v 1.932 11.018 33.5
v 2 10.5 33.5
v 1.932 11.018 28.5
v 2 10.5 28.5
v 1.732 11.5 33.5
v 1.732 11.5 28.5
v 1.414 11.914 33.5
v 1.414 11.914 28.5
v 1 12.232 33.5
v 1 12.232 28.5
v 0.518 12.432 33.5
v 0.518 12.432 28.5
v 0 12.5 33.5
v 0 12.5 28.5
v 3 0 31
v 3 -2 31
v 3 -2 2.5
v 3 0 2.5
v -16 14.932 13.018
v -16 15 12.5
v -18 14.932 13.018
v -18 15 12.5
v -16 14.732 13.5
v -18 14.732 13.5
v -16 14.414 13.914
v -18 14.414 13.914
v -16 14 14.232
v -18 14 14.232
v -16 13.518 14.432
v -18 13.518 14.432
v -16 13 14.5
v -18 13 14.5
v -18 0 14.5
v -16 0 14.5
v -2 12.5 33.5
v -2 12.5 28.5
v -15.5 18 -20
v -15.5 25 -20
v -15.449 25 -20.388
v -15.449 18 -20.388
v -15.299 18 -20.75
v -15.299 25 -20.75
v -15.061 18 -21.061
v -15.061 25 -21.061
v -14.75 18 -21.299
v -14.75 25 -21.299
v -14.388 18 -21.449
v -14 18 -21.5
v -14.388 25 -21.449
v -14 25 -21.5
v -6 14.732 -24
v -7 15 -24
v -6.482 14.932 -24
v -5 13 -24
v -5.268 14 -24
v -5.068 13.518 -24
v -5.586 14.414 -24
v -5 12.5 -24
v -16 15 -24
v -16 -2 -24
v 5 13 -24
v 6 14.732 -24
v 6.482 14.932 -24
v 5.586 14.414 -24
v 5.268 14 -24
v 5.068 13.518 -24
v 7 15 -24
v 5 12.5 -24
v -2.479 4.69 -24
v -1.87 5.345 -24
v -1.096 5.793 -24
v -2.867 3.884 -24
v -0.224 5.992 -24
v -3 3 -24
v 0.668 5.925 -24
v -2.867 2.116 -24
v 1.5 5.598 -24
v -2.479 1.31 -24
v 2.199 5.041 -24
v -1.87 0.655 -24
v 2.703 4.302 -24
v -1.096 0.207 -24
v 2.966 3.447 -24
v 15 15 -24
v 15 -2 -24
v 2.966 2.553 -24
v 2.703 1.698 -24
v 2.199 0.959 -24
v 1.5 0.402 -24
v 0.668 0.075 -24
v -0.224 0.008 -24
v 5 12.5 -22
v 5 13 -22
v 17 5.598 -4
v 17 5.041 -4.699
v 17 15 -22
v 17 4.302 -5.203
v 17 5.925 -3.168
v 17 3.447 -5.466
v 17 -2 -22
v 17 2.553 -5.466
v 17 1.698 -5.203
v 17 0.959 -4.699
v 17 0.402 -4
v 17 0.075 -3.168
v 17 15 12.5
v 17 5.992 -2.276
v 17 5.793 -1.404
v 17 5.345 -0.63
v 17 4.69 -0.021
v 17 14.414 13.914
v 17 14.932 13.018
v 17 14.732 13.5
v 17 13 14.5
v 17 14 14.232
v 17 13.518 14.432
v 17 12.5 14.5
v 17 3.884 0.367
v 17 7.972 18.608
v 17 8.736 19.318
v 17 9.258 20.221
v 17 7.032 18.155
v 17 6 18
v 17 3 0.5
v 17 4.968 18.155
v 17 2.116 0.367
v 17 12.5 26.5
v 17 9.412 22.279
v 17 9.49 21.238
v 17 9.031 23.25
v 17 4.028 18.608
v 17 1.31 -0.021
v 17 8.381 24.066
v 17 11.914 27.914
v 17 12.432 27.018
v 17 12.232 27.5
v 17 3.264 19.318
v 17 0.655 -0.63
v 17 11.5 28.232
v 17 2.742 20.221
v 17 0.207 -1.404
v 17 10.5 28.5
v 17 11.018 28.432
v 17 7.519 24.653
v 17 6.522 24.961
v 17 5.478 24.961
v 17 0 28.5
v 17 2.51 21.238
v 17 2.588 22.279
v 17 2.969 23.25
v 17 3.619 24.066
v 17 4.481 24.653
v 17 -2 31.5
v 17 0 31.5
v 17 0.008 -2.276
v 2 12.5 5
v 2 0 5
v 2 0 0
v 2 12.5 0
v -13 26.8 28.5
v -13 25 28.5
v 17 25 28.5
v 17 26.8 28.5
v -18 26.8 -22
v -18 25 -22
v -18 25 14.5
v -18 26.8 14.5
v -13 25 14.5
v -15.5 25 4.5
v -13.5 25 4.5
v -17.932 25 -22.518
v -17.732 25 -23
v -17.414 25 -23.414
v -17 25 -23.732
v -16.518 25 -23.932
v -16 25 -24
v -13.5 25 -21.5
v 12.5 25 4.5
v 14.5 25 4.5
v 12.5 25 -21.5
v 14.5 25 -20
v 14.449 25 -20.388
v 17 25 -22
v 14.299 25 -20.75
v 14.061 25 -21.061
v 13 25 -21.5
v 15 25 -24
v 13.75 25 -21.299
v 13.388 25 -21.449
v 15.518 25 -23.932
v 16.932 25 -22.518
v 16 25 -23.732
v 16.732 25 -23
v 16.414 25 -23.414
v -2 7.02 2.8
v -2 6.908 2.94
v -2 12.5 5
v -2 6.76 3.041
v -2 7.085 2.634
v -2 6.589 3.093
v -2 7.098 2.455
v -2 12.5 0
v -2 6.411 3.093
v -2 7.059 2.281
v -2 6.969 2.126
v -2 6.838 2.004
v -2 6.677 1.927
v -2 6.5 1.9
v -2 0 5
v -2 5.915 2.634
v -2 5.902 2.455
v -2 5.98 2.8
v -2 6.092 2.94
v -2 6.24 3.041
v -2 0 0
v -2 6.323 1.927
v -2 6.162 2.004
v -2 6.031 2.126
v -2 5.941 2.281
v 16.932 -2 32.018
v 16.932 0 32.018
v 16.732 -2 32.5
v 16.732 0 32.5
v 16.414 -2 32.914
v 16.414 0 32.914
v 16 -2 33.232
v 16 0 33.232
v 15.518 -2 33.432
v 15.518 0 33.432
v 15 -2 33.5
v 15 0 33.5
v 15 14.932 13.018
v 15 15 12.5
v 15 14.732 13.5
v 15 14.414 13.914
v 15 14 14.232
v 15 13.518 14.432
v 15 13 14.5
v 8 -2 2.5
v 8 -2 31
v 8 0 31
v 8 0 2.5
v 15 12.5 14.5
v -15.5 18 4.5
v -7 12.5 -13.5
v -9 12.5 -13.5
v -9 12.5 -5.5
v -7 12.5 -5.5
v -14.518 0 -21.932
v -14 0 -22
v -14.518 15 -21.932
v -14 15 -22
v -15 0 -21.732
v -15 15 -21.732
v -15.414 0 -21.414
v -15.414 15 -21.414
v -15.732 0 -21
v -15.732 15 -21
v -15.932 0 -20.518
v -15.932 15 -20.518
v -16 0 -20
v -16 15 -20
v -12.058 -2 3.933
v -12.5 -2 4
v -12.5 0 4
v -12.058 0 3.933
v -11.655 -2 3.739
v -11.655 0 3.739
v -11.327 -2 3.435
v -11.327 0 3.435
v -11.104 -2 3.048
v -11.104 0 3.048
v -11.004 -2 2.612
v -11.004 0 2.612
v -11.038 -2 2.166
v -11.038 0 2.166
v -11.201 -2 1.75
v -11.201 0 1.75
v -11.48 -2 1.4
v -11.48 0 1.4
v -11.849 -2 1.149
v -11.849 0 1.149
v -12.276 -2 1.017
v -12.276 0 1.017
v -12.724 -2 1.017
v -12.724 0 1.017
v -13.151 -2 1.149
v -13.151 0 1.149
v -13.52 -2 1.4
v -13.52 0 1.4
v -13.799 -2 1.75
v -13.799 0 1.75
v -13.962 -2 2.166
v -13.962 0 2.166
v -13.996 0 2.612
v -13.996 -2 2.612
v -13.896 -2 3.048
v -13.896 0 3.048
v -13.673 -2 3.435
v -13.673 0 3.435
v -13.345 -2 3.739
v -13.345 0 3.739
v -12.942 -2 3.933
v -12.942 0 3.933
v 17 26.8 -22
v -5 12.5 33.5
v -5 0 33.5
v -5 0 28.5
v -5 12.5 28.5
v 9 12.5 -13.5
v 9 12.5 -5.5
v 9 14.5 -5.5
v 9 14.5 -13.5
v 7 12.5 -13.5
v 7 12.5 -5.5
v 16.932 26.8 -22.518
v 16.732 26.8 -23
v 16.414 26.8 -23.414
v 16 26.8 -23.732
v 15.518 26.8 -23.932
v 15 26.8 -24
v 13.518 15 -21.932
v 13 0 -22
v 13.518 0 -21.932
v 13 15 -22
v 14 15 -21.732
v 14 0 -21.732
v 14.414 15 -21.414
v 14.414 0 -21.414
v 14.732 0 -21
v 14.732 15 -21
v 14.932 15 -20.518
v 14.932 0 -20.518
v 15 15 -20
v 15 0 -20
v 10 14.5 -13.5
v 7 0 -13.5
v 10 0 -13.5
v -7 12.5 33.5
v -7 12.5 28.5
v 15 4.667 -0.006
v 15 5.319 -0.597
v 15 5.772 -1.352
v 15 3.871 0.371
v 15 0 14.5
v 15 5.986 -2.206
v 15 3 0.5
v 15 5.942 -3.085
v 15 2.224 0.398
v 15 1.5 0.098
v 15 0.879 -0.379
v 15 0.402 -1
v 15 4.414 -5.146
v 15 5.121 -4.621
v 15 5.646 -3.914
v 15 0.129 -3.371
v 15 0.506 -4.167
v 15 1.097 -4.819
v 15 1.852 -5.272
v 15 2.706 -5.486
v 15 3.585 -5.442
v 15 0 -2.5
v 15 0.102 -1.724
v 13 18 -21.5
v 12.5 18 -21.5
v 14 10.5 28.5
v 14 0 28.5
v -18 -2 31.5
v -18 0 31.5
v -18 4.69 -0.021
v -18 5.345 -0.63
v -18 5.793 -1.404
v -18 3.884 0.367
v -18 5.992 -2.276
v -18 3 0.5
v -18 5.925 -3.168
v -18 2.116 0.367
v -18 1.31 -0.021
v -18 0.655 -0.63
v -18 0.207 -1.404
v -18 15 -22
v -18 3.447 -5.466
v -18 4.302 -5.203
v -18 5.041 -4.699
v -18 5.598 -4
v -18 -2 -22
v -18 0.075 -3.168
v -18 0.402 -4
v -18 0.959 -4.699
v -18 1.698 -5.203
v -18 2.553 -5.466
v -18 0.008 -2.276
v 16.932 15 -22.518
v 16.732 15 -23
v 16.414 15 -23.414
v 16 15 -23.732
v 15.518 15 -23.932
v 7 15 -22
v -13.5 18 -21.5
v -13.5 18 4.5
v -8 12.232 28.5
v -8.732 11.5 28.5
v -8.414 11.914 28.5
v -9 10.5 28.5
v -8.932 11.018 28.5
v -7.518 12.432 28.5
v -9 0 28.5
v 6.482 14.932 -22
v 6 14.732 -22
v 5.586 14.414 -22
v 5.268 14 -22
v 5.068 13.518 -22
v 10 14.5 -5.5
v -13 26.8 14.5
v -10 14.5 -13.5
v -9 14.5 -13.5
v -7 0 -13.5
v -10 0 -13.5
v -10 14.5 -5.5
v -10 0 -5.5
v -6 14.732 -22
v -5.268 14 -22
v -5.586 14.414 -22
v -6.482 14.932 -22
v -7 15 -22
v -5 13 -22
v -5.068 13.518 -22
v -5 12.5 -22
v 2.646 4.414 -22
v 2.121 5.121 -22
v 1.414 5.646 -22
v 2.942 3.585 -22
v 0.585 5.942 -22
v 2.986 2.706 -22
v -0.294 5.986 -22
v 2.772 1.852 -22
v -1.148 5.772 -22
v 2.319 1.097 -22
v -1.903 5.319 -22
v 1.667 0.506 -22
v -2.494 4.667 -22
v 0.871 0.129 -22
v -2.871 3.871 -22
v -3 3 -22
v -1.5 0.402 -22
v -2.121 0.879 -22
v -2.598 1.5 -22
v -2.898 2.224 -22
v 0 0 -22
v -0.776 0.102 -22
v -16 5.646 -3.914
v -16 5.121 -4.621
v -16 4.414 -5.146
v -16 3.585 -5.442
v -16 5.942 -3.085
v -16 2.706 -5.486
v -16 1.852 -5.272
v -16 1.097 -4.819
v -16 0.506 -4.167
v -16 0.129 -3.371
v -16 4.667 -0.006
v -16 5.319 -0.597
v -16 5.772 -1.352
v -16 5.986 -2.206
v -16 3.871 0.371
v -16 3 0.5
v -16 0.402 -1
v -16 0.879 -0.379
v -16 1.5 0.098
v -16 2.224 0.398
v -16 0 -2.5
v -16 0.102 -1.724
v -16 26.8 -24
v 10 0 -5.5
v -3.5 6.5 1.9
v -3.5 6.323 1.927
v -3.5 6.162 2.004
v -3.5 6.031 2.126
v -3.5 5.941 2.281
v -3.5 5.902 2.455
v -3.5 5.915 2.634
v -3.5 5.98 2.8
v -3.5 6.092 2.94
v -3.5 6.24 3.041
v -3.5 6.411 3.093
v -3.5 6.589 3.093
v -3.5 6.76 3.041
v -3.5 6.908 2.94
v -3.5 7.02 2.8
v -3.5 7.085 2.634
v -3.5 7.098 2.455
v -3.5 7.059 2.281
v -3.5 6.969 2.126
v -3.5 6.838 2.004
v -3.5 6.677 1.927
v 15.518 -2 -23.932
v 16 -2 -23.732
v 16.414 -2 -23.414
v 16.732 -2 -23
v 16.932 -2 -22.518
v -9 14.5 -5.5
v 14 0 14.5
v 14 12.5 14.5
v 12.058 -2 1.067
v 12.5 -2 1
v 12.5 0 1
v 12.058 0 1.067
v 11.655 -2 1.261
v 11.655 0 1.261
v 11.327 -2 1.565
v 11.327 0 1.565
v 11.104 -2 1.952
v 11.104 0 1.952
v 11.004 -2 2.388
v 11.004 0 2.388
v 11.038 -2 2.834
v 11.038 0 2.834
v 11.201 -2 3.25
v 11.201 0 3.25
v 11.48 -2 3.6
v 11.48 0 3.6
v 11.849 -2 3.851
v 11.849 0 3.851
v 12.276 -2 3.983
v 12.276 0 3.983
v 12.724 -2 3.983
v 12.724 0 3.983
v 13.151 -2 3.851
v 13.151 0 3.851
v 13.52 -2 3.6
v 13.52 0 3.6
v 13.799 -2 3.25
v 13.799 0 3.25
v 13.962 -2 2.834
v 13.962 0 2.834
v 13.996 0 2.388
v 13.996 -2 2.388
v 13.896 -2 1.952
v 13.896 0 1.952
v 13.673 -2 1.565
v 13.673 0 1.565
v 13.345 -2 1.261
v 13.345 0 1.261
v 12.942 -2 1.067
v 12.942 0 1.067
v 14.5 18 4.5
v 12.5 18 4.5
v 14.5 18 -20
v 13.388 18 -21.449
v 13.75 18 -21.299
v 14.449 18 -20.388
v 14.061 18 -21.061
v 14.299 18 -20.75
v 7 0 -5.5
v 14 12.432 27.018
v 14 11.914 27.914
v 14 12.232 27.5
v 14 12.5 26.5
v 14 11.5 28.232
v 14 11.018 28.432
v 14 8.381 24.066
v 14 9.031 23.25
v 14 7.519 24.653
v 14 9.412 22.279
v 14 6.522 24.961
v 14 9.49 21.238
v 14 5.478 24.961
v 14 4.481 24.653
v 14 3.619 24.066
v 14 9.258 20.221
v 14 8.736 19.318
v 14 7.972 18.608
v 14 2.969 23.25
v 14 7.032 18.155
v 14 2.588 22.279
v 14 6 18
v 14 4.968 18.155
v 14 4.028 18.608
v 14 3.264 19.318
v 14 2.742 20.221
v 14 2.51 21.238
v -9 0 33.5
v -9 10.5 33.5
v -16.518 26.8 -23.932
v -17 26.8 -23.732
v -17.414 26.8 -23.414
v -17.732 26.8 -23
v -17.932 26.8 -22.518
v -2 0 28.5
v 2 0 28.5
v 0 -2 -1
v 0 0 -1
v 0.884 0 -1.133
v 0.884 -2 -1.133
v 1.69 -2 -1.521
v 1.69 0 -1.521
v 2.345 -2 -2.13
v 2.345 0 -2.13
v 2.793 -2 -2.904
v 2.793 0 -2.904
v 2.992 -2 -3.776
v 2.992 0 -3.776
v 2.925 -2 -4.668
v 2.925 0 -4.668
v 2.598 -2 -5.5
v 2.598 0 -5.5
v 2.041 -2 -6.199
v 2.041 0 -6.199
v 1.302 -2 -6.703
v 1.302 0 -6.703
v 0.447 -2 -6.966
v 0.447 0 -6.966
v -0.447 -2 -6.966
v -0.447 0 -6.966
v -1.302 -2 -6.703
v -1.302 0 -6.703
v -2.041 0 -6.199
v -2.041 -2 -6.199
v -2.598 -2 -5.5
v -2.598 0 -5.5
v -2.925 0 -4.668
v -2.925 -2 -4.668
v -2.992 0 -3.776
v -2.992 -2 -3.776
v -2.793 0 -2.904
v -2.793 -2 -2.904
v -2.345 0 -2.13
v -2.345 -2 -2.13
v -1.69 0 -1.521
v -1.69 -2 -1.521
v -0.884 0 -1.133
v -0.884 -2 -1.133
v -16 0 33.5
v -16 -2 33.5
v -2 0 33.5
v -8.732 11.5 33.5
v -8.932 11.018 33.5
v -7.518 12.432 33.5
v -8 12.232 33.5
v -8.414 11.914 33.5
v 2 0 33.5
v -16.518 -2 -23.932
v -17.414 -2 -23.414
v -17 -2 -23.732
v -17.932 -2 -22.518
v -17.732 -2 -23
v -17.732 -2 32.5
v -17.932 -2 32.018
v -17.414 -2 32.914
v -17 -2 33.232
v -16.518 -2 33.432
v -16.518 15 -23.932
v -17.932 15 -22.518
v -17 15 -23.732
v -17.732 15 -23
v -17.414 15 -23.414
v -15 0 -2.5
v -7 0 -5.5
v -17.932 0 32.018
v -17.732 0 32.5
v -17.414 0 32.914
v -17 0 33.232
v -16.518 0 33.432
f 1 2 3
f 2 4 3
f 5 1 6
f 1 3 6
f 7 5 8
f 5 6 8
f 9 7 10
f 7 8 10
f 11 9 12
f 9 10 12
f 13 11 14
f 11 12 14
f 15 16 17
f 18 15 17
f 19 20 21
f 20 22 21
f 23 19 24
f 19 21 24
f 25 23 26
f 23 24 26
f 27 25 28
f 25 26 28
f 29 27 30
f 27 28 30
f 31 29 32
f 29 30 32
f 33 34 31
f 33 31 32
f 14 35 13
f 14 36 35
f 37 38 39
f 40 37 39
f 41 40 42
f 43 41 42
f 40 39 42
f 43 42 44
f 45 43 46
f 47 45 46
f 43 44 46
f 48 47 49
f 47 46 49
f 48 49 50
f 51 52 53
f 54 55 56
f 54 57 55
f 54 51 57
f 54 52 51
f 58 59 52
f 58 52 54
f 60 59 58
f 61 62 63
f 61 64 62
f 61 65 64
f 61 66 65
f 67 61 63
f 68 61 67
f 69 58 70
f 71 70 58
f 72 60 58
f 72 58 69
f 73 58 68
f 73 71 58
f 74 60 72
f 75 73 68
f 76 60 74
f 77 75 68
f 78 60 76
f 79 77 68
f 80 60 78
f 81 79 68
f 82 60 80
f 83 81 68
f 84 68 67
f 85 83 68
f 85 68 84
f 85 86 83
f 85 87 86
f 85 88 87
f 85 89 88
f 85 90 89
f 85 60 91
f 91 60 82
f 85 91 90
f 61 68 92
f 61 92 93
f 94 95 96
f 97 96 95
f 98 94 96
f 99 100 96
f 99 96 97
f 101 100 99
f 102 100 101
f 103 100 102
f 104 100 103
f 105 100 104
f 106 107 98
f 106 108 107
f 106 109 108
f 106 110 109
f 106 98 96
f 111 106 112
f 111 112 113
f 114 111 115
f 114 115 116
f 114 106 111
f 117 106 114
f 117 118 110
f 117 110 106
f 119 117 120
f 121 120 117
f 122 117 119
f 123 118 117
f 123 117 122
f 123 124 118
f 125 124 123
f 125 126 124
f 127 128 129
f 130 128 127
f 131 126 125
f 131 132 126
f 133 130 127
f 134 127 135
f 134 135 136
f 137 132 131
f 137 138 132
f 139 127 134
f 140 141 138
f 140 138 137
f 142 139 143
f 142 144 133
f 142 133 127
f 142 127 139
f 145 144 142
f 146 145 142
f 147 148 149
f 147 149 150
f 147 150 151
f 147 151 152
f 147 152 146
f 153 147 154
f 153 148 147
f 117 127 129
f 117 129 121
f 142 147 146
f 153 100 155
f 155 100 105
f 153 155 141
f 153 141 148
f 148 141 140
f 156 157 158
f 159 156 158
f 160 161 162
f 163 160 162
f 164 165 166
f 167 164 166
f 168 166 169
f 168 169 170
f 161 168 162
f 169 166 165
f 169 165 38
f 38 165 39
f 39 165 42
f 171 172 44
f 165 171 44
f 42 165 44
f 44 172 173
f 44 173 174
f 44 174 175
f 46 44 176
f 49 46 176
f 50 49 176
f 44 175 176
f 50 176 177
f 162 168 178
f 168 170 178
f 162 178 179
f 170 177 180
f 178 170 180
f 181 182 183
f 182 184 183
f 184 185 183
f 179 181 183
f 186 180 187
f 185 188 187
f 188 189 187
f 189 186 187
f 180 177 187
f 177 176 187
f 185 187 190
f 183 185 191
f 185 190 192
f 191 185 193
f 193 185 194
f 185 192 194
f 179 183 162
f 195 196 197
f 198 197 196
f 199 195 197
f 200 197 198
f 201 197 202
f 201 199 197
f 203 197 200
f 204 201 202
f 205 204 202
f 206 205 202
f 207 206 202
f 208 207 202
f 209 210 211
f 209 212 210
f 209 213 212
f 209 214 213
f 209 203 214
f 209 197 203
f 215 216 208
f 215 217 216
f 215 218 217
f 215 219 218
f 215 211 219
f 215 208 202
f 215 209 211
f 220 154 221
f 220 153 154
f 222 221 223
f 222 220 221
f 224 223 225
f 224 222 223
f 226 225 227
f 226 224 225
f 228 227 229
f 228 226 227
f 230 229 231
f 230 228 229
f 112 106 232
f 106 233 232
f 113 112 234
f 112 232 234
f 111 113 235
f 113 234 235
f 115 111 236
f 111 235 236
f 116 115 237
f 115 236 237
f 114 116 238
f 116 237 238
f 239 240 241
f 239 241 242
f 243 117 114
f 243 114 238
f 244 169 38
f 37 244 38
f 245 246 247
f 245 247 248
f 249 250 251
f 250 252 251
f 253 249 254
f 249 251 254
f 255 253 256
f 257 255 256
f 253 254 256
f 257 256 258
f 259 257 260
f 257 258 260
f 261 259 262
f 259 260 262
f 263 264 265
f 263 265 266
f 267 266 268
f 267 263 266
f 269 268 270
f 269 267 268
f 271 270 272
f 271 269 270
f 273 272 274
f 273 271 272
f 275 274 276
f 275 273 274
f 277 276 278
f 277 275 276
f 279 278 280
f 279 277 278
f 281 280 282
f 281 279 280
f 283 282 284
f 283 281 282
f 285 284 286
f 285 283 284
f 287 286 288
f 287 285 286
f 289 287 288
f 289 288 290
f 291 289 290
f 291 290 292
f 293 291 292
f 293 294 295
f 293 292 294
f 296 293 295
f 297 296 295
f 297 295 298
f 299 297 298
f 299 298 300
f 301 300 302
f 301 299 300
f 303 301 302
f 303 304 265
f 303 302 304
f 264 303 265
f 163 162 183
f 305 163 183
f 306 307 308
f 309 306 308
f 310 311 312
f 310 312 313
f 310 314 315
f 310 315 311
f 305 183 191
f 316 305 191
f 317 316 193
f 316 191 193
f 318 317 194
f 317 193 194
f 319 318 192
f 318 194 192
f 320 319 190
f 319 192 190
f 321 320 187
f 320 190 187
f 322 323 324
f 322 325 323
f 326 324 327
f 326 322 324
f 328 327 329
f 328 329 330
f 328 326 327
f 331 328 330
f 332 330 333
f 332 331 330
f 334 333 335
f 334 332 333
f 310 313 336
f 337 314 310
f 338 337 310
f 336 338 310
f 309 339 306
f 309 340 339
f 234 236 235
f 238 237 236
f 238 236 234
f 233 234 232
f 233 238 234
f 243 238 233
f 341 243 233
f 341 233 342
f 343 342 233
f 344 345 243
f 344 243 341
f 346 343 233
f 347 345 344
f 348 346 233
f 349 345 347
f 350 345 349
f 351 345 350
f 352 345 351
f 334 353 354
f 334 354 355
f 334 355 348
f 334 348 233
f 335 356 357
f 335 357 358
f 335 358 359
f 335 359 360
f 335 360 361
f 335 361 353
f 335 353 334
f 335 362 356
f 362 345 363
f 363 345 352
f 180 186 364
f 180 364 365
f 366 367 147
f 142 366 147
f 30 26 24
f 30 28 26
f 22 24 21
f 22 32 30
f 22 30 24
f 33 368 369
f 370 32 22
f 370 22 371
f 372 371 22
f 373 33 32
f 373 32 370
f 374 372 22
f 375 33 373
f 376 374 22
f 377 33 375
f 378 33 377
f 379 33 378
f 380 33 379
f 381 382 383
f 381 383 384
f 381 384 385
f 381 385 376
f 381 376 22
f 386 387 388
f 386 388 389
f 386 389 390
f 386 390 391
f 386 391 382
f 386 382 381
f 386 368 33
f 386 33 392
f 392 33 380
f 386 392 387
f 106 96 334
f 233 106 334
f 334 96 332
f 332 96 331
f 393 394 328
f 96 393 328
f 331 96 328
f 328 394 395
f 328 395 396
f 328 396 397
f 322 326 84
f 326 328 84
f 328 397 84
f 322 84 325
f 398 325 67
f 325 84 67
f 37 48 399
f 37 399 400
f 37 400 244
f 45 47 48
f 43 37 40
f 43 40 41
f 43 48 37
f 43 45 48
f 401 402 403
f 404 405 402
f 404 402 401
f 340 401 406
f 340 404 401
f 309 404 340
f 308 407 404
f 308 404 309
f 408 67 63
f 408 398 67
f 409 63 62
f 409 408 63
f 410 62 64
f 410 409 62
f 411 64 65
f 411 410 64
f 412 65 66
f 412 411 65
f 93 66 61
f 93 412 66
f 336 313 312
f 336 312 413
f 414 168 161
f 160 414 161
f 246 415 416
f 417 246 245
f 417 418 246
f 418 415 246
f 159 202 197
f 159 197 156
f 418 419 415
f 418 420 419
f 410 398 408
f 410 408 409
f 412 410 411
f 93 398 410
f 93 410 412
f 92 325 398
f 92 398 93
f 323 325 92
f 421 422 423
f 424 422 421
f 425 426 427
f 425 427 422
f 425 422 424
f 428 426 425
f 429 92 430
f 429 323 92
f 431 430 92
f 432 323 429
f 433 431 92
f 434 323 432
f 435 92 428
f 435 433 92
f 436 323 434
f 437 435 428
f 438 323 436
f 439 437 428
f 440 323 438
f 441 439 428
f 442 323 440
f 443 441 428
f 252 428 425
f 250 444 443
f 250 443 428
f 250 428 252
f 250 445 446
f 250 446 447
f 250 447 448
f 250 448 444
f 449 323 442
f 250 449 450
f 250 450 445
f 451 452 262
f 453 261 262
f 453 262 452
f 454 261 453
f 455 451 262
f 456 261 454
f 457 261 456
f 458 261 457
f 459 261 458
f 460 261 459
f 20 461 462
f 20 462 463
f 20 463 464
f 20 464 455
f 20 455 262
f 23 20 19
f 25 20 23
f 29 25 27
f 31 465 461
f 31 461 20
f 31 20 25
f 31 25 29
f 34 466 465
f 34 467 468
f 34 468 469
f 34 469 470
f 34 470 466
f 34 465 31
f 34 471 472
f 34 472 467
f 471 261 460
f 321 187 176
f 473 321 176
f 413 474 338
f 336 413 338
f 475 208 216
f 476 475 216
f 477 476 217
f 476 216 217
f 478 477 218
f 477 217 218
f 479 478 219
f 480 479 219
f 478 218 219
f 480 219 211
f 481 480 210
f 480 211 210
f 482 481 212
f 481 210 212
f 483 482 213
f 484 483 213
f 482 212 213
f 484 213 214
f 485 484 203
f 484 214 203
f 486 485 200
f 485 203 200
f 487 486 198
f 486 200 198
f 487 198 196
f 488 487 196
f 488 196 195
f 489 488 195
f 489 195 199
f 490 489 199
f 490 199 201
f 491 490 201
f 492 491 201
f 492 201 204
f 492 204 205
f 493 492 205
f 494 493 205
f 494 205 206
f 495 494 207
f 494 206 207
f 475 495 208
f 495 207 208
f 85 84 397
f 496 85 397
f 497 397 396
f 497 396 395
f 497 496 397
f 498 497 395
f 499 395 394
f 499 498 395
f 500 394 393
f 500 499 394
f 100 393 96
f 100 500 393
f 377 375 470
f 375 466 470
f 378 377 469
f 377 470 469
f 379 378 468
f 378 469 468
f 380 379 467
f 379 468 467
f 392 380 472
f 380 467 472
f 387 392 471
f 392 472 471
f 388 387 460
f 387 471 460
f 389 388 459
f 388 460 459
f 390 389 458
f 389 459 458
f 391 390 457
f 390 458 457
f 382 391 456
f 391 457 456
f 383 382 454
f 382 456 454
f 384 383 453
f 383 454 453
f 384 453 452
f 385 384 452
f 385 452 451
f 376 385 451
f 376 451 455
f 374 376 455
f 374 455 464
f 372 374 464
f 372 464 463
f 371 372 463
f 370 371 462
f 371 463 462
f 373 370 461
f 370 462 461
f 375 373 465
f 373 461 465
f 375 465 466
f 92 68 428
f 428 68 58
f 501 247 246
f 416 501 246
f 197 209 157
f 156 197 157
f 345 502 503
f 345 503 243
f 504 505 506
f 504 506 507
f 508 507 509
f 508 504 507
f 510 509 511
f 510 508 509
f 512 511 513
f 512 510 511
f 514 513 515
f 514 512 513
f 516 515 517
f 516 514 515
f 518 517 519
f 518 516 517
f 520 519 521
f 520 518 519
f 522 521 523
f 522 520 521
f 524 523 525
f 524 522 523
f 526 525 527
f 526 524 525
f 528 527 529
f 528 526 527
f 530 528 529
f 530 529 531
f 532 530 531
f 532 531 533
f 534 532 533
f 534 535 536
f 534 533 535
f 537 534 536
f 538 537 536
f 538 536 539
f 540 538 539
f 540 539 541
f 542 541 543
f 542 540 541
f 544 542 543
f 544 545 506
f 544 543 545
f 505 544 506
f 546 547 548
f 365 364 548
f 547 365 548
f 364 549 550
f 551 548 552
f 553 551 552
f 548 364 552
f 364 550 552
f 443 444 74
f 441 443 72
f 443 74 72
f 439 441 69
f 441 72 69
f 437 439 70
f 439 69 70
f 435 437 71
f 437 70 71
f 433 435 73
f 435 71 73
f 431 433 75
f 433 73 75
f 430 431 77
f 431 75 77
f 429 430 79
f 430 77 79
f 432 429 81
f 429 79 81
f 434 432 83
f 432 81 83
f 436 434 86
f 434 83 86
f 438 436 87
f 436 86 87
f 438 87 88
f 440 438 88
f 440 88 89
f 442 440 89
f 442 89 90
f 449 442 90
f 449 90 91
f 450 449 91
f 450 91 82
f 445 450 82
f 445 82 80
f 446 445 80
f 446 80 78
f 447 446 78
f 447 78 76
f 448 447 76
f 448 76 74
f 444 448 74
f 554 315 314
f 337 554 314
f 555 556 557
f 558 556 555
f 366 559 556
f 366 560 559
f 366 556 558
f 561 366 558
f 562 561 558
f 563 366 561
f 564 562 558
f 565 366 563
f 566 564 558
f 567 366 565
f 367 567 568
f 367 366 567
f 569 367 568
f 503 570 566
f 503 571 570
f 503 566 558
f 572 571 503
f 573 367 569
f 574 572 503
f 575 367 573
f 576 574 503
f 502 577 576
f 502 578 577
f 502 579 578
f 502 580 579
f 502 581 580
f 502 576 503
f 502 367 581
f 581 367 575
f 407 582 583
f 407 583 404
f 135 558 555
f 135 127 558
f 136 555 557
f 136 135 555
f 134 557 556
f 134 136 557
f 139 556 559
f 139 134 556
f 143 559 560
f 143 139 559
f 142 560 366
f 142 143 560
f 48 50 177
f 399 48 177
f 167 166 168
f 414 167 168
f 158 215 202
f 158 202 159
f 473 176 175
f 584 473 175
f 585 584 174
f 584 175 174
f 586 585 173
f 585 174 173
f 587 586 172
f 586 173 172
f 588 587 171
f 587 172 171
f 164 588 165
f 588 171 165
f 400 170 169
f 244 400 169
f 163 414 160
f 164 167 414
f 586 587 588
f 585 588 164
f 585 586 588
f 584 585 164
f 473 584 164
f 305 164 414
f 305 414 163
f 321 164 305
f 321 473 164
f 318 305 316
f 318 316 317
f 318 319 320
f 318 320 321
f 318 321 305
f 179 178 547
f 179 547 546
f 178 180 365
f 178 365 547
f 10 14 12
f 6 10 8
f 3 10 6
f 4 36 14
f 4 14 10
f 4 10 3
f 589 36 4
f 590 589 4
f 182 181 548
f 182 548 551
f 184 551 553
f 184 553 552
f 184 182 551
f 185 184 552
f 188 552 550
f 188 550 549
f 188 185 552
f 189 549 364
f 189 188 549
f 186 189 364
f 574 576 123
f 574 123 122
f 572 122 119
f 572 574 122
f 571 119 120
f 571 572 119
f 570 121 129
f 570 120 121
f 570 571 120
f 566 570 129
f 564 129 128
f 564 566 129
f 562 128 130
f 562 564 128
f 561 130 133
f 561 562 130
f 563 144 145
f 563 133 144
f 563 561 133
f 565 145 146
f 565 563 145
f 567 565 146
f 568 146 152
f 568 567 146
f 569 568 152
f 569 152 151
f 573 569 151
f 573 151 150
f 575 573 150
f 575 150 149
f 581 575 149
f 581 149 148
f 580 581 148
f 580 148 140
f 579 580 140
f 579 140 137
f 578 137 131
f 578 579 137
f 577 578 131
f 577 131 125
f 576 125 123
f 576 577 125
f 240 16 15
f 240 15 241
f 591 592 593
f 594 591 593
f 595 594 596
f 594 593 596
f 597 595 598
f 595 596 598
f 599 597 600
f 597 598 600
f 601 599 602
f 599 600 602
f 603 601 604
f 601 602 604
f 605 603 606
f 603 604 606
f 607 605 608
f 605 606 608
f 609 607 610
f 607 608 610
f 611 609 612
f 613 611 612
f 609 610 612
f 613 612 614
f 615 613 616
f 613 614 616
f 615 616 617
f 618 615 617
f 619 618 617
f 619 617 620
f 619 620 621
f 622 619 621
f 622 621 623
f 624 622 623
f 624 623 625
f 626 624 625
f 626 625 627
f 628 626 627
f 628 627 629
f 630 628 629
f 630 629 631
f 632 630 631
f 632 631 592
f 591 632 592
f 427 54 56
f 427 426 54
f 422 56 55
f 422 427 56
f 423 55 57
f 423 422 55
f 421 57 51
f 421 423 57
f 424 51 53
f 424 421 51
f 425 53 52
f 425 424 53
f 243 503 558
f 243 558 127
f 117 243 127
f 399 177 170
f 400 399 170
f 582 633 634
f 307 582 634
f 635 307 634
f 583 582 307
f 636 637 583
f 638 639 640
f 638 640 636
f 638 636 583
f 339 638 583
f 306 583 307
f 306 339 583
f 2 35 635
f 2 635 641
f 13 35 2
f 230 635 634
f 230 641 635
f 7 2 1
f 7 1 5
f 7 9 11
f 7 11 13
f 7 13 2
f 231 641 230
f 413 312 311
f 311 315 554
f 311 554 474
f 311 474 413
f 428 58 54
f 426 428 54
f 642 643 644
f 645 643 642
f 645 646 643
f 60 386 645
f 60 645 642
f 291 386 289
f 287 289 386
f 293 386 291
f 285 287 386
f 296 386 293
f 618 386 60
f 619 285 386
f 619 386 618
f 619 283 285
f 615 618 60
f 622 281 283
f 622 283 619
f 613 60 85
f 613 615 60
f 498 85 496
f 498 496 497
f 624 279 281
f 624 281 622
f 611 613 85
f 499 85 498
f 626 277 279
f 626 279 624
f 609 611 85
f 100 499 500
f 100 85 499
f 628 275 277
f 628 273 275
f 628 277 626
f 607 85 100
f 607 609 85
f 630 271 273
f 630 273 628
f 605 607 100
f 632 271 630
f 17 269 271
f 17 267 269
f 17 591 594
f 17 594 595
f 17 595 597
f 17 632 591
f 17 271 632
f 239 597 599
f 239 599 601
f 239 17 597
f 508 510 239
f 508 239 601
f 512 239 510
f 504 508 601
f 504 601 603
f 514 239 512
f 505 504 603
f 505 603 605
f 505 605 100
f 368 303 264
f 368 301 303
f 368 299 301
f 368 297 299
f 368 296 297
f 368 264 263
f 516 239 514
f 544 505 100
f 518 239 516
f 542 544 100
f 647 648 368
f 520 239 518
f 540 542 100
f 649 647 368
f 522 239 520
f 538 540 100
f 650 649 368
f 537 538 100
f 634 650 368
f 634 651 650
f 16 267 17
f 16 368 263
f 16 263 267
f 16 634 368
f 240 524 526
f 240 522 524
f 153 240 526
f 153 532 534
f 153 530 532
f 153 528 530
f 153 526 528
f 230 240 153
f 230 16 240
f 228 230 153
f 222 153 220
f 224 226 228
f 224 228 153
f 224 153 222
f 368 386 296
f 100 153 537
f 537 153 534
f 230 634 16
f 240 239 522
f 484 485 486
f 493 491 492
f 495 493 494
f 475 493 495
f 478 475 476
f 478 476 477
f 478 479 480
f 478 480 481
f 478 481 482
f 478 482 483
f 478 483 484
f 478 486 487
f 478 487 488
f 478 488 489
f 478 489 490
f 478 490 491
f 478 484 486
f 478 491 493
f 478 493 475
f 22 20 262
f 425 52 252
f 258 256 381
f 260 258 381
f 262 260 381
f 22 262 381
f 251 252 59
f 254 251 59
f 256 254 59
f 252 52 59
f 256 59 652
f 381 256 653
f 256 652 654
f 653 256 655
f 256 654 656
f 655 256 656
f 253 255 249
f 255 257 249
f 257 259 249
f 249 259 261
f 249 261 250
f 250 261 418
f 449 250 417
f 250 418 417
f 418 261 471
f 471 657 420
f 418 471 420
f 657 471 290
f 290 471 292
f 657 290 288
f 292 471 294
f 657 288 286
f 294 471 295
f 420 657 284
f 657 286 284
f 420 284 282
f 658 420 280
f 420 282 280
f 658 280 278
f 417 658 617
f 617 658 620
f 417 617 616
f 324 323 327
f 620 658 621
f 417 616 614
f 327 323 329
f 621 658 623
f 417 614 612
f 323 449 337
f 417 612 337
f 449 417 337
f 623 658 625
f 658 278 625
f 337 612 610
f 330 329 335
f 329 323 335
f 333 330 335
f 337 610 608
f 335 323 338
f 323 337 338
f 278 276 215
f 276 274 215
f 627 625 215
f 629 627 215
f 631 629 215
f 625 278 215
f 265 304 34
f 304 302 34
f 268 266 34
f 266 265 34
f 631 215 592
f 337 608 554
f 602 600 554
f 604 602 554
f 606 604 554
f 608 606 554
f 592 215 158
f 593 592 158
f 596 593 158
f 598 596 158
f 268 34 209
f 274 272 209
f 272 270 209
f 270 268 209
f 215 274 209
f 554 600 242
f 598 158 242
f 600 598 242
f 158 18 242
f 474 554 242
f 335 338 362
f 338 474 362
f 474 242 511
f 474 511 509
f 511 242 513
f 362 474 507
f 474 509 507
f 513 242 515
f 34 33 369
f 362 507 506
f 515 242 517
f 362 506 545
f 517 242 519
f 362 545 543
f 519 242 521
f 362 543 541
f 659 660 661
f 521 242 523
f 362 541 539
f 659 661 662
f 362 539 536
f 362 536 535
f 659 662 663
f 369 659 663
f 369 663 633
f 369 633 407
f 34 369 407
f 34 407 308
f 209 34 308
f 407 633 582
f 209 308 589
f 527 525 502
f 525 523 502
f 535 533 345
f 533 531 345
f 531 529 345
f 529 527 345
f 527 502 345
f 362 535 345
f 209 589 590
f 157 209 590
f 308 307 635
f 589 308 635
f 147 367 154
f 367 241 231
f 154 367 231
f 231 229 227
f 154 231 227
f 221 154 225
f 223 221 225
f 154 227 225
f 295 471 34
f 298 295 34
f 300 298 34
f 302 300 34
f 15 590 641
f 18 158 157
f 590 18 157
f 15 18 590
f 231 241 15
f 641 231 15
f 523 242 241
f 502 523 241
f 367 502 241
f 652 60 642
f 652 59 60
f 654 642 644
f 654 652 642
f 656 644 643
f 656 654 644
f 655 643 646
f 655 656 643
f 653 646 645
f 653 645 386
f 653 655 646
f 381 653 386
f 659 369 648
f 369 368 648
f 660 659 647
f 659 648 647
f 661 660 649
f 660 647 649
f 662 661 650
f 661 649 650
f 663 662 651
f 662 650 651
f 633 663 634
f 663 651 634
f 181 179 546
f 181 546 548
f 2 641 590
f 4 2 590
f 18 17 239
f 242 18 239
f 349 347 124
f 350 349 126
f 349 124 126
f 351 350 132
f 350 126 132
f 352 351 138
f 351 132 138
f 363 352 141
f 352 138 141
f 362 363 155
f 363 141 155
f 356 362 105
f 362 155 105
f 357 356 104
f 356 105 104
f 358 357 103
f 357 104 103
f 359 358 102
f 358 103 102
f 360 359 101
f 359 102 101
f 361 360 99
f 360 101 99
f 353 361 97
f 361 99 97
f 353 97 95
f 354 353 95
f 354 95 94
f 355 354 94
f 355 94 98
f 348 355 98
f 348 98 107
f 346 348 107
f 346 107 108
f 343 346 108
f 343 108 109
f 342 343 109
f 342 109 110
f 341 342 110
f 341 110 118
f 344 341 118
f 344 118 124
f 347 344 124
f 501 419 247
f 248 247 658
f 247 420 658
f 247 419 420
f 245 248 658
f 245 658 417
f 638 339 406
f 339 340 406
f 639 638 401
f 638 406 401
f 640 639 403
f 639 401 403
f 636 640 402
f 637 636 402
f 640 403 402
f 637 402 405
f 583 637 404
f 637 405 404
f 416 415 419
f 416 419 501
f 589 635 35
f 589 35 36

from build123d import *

# Parameters (mm, degrees)
SKETCH2_W                      = 3
SKETCH2_H                      = 14
BOSS_EXTRUDE2_DEPTH            = 12.5
SKETCH2_W_2                    = 4
SKETCH2_H_2                    = 5
BOSS_EXTRUDE2_2_DEPTH          = 12.5
BOSS_EXTRUDE2_3_DEPTH          = 12.5
BOSS_EXTRUDE2_4_DEPTH          = 12.5
SKETCH3_W                      = 35
SKETCH3_H                      = 57.5
BOSS_EXTRUDE3_DEPTH            = 2
CUT_EXTRUDE1_DEPTH             = 41.031237802
CUT_EXTRUDE1_DEPTH_BACK        = 41.031237802
SKETCH4_R                      = 3.5
SKETCH5_R                      = 0.6
BOSS_EXTRUDE4_DEPTH            = 1.5
SKETCH6_W                      = 3
SKETCH6_H                      = 8
BOSS_EXTRUDE5_DEPTH            = 12.5
SKETCH14_W                     = 1
SKETCH14_H                     = 8
BOSS_EXTRUDE7_DEPTH            = 2
BOSS_EXTRUDE8_DEPTH            = 15
CUT_EXTRUDE3_REACH             = 64.091
SKETCH10_R                     = 3
CUT_EXTRUDE4_DEPTH             = 41.880924647
CUT_EXTRUDE4_DEPTH_BACK        = 41.880924647
SKETCH12_R                     = 1.5
CUT_EXTRUDE5_DEPTH             = 41.880924647
CUT_EXTRUDE5_DEPTH_BACK        = 41.880924647
SKETCH15_W                     = 5
SKETCH15_H                     = 28.5
CUT_EXTRUDE7_REACH             = 64.091
SKETCH17_W                     = 10
SKETCH17_H                     = 5
FILLET1_R                      = 2
CUT_EXTRUDE8_REACH             = 52.717
SKETCH18_R                     = 3
CUT_EXTRUDE8_DIRECTION_2_DEPTH = 51.717354032
CUT_EXTRUDE9_REACH             = 64.091
SKETCH19_R                     = 3
BOSS_EXTRUDE10_DEPTH           = 7
BOSS_EXTRUDE10_2_DEPTH         = 7
BOSS_EXTRUDE9_DEPTH            = 1.8


with BuildPart() as part:
    # Sketch2 → Boss-Extrude2 (new body)
    with BuildSketch(Plane(origin=(0, 0, 0), x_dir=(1, 0, 0), z_dir=(0, 1, 0))):
        with Locations((15.5, -21.5)):
            Rectangle(SKETCH2_W, SKETCH2_H)
    extrude(amount=BOSS_EXTRUDE2_DEPTH)



with BuildPart() as body_2:
    # Sketch2 → Boss-Extrude2 2 (new body)
    with BuildSketch(Plane(origin=(0, 0, 0), x_dir=(1, 0, 0), z_dir=(0, 1, 0))):
        with Locations((0, -31)):
            Rectangle(SKETCH2_W_2, SKETCH2_H_2)
    extrude(amount=BOSS_EXTRUDE2_2_DEPTH)


with BuildPart() as body_3:
    # Sketch2 → Boss-Extrude2 3 (new body)
    with BuildSketch(Plane(origin=(0, 0, 0), x_dir=(1, 0, 0), z_dir=(0, 1, 0))):
        with Locations((0, -2.5)):
            Rectangle(SKETCH2_W_2, SKETCH2_H_2)
    extrude(amount=BOSS_EXTRUDE2_3_DEPTH)


with BuildPart() as body_4:
    # Sketch2 → Boss-Extrude2 4 (new body)
    with BuildSketch(Plane(origin=(0, 0, 0), x_dir=(1, 0, 0), z_dir=(0, 1, 0))):
        with Locations((-7, -31)):
            Rectangle(SKETCH2_W_2, SKETCH2_H_2)
    extrude(amount=BOSS_EXTRUDE2_4_DEPTH)


with BuildPart() as part_1:
    add(part.part)

    add(body_2.part)  # Boss-Extrude3 merges body 2

    add(body_3.part)  # Boss-Extrude3 merges body 3

    add(body_4.part)  # Boss-Extrude3 merges body 4
    # Sketch3 → Boss-Extrude3 (add)
    with BuildSketch(Plane.XZ):
        with Locations((-0.5, 4.75)):
            Rectangle(SKETCH3_W, SKETCH3_H)
    extrude(amount=BOSS_EXTRUDE3_DEPTH)

    # Sketch4 → Cut-Extrude1 (cut, two sides: drawn at the far end of the back side and taken through both)
    with BuildSketch(Plane(origin=(0, 0, 0), x_dir=(0, 0, -1), z_dir=(1, 0, 0)).offset(-CUT_EXTRUDE1_DEPTH_BACK)):
        with Locations((-21.5, 6)):
            Circle(SKETCH4_R)
    extrude(amount=CUT_EXTRUDE1_DEPTH + CUT_EXTRUDE1_DEPTH_BACK, mode=Mode.SUBTRACT)

    # Sketch5 → Boss-Extrude4 (add)
    with BuildSketch(Plane.ZY.offset(2)):
        with Locations(Location((2.5, 6.5, 0), (0, 0, 180))):
            Circle(SKETCH5_R)
    extrude(amount=BOSS_EXTRUDE4_DEPTH)

    # Sketch6 → Boss-Extrude5 (add)
    with BuildSketch(Plane(origin=(0, 0, 0), x_dir=(1, 0, 0), z_dir=(0, 1, 0))):
        with Locations((-8.5, 9.5)):
            Rectangle(SKETCH6_W, SKETCH6_H)
        with Locations((8.5, 9.5)):
            Rectangle(SKETCH6_W, SKETCH6_H)
    extrude(amount=BOSS_EXTRUDE5_DEPTH)

    # Sketch14 → Boss-Extrude7 (add)
    with BuildSketch(Plane(origin=(0, 12.5, 0), x_dir=(1, 0, 0), z_dir=(0, 1, 0))):
        with Locations((-9.5, 9.5)):
            Rectangle(SKETCH14_W, SKETCH14_H)
        with Locations((9.5, 9.5)):
            Rectangle(SKETCH14_W, SKETCH14_H)
    extrude(amount=BOSS_EXTRUDE7_DEPTH)

    # Sketch9 → Boss-Extrude8 (add)
    with BuildSketch(Plane(origin=(0, 0, 0), x_dir=(1, 0, 0), z_dir=(0, 1, 0))):
        Polygon((-18, 24), (17, 24), (17, -14.5), (15, -14.5), (15, 22), (-16, 22), (-16, -14.5), (-18, -14.5), align=None)
    extrude(amount=BOSS_EXTRUDE8_DEPTH)

    # Sketch10 → Cut-Extrude3 (cut, up to next)
    with BuildSketch(Plane(origin=(0, 0, -24), x_dir=(-1, 0, 0), z_dir=(0, 1, 0)), mode=Mode.PRIVATE) as cut_extrude3_sk1:
        with Locations(Location((0, 20, 0), (0, 0, 90))):
            Circle(SKETCH10_R)
    cut_extrude3_tool1 = extrude(cut_extrude3_sk1.sketch, amount=-CUT_EXTRUDE3_REACH, mode=Mode.PRIVATE) & part_1.part
    add(cut_extrude3_tool1.solids().sort_by_distance((0, 0, -4))[0], mode=Mode.SUBTRACT)

    # Sketch12 → Cut-Extrude4 (cut, two sides: drawn at the far end of the back side and taken through both)
    with BuildSketch(Plane(origin=(0, 0, 0), x_dir=(1, 0, 0), z_dir=(0, 1, 0)).offset(-CUT_EXTRUDE4_DEPTH_BACK)):
        with Locations(Location((-12.5, -2.5, 0), (0, 0, 270))):
            Circle(SKETCH12_R)
        with Locations(Location((12.5, -2.5, 0), (0, 0, 90))):
            Circle(SKETCH12_R)
    extrude(amount=CUT_EXTRUDE4_DEPTH + CUT_EXTRUDE4_DEPTH_BACK, mode=Mode.SUBTRACT)

    # Sketch15 → Cut-Extrude5 (cut, two sides: drawn at the far end of the back side and taken through both)
    with BuildSketch(Plane(origin=(0, 0, 0), x_dir=(1, 0, 0), z_dir=(0, 1, 0)).offset(-CUT_EXTRUDE5_DEPTH_BACK)):
        with Locations((5.5, -16.75)):
            Rectangle(SKETCH15_W, SKETCH15_H)
    extrude(amount=CUT_EXTRUDE5_DEPTH + CUT_EXTRUDE5_DEPTH_BACK, mode=Mode.SUBTRACT)

    # Sketch17 → Cut-Extrude7 (cut, up to next)
    with BuildSketch(Plane(origin=(0, 0, -24), x_dir=(-1, 0, 0), z_dir=(0, 0, -1)), mode=Mode.PRIVATE) as cut_extrude7_sk1:
        with Locations((0, 15)):
            Rectangle(SKETCH17_W, SKETCH17_H)
    cut_extrude7_tool1 = extrude(cut_extrude7_sk1.sketch, amount=-CUT_EXTRUDE7_REACH, mode=Mode.PRIVATE) & part_1.part
    add(cut_extrude7_tool1.solids().sort_by_distance((0, 15, -24))[0], mode=Mode.SUBTRACT)

    # Fillet1
    fillet1_edges = [part_1.edges().sort_by_distance(p)[0] for p in [
        (15.5, 12.5, 28.5),
        (16, 15, 14.5),
        (5, 15, -23),
        (-5, 15, -23),
        (-17, 15, 14.5),
        (-18, -1, 33.5),
        (-18, 6.5, -24),
        (17, 6.5, -24),
        (15, 7.5, -22),
        (-16, 7.5, -22),
        (2, 12.5, 31),
        (-9, 12.5, 31),
        (17, -1, 33.5),
    ]]
    fillet(fillet1_edges, radius=FILLET1_R)

    # Sketch18 → Cut-Extrude8 (cut, up to next)
    with BuildSketch(Plane(origin=(17, 0, 0), x_dir=(0, 0, -1), z_dir=(1, 0, 0)), mode=Mode.PRIVATE) as cut_extrude8_sk1:
        with Locations(Location((2.5, 3, 0), (0, 0, 180))):
            Circle(SKETCH18_R)
    cut_extrude8_tool1 = extrude(cut_extrude8_sk1.sketch, amount=-CUT_EXTRUDE8_REACH, mode=Mode.PRIVATE) & part_1.part
    cut_extrude8 = cut_extrude8_tool1.solids().sort_by_distance((17, 3, -2.5))[0]
    add(cut_extrude8, mode=Mode.SUBTRACT)

    # Sketch18 → Cut-Extrude8 direction 2 (cut)
    with BuildSketch(Plane(origin=(17, 0, 0), x_dir=(0, 0, -1), z_dir=(1, 0, 0))):
        with Locations(Location((2.5, 3, 0), (0, 0, 180))):
            Circle(SKETCH18_R)
    cut_extrude8_direction_2 = extrude(amount=CUT_EXTRUDE8_DIRECTION_2_DEPTH, mode=Mode.SUBTRACT)

    # Mirror1: Cut-Extrude8, Cut-Extrude8 direction 2 across plane
    add(cut_extrude8.mirror(Plane(origin=(0, 0, 0), x_dir=(0, 0, 1), z_dir=(1, 0, 0))), mode=Mode.SUBTRACT)
    add(cut_extrude8_direction_2.mirror(Plane(origin=(0, 0, 0), x_dir=(0, 0, 1), z_dir=(1, 0, 0))), mode=Mode.SUBTRACT)

    # Sketch19 → Cut-Extrude9 (cut, up to next)
    with BuildSketch(Plane(origin=(0, 0, -24), x_dir=(-1, 0, 0), z_dir=(0, 0, -1)), mode=Mode.PRIVATE) as cut_extrude9_sk1:
        with Locations((0, 3)):
            Circle(SKETCH19_R)
    cut_extrude9_tool1 = extrude(cut_extrude9_sk1.sketch, amount=-CUT_EXTRUDE9_REACH, mode=Mode.PRIVATE) & part_1.part
    add(cut_extrude9_tool1.solids().sort_by_distance((0, 3, -24))[0], mode=Mode.SUBTRACT)


with BuildPart() as body_2_2:
    # Sketch22 → Boss-Extrude10 (new body)
    with BuildSketch(Plane(origin=(0, 25, 0), x_dir=(1, 0, 0), z_dir=(0, 1, 0))):
        with BuildLine():
            Line((-14, 21.5), (-13.5, 21.5))
            Line((-13.5, 21.5), (-13.5, -4.5))
            Line((-13.5, -4.5), (-15.5, -4.5))
            Line((-15.5, -4.5), (-15.5, 20))
            ThreePointArc((-15.5, 20), (-15.060660172, 21.060660172), (-14, 21.5))
        make_face()
    extrude(amount=-BOSS_EXTRUDE10_DEPTH)



with BuildPart() as body_3_2:
    # Sketch22 → Boss-Extrude10 2 (new body)
    with BuildSketch(Plane(origin=(0, 25, 0), x_dir=(1, 0, 0), z_dir=(0, 1, 0))):
        with BuildLine():
            Line((12.5, -4.5), (14.5, -4.5))
            Line((14.5, -4.5), (14.5, 20))
            ThreePointArc((14.5, 20), (14.060660172, 21.060660172), (13, 21.5))
            Line((13, 21.5), (12.5, 21.5))
            Line((12.5, 21.5), (12.5, -4.5))
        make_face()
    extrude(amount=-BOSS_EXTRUDE10_2_DEPTH)


with BuildPart() as body_2_2_1:
    add(body_2_2.part)

    add(body_3_2.part)  # Boss-Extrude9 merges body 3 2
    # Sketch21 → Boss-Extrude9 (add)
    with BuildSketch(Plane(origin=(0, 25, 0), x_dir=(1, 0, 0), z_dir=(0, 1, 0))):
        with BuildLine():
            Line((-18, -12.5), (-18, -14.5))
            Line((-18, -14.5), (-13, -14.5))
            Line((-13, -14.5), (-13, -28.5))
            Line((-13, -28.5), (17, -28.5))
            Line((17, -28.5), (17, -12.5))
            Line((17, -12.5), (17, 22))
            ThreePointArc((17, 22), (16.414213562, 23.414213562), (15, 24))
            Line((15, 24), (7, 24))
            Line((7, 24), (5, 24))
            Line((5, 24), (-5, 24))
            Line((-5, 24), (-7, 24))
            Line((-7, 24), (-16, 24))
            ThreePointArc((-16, 24), (-17.414213562, 23.414213562), (-18, 22))
            Line((-18, 22), (-18, -12.5))
        make_face()
    extrude(amount=BOSS_EXTRUDE9_DEPTH)


solid = Compound([part_1.part, body_2_2_1.part])
